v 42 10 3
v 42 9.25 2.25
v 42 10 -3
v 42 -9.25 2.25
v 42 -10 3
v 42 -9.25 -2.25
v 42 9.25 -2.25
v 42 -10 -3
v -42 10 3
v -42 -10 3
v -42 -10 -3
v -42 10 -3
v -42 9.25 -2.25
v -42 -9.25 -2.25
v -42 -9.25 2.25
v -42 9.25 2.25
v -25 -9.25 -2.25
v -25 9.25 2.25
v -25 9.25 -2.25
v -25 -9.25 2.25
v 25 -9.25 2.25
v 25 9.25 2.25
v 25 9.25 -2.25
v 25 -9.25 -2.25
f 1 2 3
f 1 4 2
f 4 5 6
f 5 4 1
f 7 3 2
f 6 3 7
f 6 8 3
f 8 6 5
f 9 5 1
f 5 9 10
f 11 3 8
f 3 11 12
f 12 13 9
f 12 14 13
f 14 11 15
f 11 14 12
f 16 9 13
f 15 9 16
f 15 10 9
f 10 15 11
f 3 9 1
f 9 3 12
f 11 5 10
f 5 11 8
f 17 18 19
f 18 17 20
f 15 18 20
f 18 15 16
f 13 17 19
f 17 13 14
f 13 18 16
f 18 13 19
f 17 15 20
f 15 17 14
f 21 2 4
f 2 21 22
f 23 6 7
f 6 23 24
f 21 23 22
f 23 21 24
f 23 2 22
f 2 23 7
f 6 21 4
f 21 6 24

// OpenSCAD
RA_abstand=84;
RA_staerke=3;

module _rahmenverbinder_base() {
	rotate([90,0,0]) difference() {
		cube(size=[RA_abstand, 20, 6], center=true);
		translate([-35,0,0]) cube(size=[20, 18.5, 4.5], center=true);
		translate([+35,0,0]) cube(size=[20, 18.5, 4.5], center=true);
	}
}

// Stehend
// kein Raft, 0.30mm, 8%, 110/160 mm/s, 14min, 5.2g
// neu mit Löchern: kein Raft, 0.30mm, 8%, 110/170 mm/s,  14min, 5.0g

// Origin: Mitte
module rahmenverbinder() {
	rotate([-90,0,0]) _rahmenverbinder_base();
}

module rahmenverbinder_nupsi() {
	translate([-RA_abstand/2 + 15/2,0,0])
	cube(size=[15, 16.8, 3.8], center=true);
}

rahmenverbinder();
